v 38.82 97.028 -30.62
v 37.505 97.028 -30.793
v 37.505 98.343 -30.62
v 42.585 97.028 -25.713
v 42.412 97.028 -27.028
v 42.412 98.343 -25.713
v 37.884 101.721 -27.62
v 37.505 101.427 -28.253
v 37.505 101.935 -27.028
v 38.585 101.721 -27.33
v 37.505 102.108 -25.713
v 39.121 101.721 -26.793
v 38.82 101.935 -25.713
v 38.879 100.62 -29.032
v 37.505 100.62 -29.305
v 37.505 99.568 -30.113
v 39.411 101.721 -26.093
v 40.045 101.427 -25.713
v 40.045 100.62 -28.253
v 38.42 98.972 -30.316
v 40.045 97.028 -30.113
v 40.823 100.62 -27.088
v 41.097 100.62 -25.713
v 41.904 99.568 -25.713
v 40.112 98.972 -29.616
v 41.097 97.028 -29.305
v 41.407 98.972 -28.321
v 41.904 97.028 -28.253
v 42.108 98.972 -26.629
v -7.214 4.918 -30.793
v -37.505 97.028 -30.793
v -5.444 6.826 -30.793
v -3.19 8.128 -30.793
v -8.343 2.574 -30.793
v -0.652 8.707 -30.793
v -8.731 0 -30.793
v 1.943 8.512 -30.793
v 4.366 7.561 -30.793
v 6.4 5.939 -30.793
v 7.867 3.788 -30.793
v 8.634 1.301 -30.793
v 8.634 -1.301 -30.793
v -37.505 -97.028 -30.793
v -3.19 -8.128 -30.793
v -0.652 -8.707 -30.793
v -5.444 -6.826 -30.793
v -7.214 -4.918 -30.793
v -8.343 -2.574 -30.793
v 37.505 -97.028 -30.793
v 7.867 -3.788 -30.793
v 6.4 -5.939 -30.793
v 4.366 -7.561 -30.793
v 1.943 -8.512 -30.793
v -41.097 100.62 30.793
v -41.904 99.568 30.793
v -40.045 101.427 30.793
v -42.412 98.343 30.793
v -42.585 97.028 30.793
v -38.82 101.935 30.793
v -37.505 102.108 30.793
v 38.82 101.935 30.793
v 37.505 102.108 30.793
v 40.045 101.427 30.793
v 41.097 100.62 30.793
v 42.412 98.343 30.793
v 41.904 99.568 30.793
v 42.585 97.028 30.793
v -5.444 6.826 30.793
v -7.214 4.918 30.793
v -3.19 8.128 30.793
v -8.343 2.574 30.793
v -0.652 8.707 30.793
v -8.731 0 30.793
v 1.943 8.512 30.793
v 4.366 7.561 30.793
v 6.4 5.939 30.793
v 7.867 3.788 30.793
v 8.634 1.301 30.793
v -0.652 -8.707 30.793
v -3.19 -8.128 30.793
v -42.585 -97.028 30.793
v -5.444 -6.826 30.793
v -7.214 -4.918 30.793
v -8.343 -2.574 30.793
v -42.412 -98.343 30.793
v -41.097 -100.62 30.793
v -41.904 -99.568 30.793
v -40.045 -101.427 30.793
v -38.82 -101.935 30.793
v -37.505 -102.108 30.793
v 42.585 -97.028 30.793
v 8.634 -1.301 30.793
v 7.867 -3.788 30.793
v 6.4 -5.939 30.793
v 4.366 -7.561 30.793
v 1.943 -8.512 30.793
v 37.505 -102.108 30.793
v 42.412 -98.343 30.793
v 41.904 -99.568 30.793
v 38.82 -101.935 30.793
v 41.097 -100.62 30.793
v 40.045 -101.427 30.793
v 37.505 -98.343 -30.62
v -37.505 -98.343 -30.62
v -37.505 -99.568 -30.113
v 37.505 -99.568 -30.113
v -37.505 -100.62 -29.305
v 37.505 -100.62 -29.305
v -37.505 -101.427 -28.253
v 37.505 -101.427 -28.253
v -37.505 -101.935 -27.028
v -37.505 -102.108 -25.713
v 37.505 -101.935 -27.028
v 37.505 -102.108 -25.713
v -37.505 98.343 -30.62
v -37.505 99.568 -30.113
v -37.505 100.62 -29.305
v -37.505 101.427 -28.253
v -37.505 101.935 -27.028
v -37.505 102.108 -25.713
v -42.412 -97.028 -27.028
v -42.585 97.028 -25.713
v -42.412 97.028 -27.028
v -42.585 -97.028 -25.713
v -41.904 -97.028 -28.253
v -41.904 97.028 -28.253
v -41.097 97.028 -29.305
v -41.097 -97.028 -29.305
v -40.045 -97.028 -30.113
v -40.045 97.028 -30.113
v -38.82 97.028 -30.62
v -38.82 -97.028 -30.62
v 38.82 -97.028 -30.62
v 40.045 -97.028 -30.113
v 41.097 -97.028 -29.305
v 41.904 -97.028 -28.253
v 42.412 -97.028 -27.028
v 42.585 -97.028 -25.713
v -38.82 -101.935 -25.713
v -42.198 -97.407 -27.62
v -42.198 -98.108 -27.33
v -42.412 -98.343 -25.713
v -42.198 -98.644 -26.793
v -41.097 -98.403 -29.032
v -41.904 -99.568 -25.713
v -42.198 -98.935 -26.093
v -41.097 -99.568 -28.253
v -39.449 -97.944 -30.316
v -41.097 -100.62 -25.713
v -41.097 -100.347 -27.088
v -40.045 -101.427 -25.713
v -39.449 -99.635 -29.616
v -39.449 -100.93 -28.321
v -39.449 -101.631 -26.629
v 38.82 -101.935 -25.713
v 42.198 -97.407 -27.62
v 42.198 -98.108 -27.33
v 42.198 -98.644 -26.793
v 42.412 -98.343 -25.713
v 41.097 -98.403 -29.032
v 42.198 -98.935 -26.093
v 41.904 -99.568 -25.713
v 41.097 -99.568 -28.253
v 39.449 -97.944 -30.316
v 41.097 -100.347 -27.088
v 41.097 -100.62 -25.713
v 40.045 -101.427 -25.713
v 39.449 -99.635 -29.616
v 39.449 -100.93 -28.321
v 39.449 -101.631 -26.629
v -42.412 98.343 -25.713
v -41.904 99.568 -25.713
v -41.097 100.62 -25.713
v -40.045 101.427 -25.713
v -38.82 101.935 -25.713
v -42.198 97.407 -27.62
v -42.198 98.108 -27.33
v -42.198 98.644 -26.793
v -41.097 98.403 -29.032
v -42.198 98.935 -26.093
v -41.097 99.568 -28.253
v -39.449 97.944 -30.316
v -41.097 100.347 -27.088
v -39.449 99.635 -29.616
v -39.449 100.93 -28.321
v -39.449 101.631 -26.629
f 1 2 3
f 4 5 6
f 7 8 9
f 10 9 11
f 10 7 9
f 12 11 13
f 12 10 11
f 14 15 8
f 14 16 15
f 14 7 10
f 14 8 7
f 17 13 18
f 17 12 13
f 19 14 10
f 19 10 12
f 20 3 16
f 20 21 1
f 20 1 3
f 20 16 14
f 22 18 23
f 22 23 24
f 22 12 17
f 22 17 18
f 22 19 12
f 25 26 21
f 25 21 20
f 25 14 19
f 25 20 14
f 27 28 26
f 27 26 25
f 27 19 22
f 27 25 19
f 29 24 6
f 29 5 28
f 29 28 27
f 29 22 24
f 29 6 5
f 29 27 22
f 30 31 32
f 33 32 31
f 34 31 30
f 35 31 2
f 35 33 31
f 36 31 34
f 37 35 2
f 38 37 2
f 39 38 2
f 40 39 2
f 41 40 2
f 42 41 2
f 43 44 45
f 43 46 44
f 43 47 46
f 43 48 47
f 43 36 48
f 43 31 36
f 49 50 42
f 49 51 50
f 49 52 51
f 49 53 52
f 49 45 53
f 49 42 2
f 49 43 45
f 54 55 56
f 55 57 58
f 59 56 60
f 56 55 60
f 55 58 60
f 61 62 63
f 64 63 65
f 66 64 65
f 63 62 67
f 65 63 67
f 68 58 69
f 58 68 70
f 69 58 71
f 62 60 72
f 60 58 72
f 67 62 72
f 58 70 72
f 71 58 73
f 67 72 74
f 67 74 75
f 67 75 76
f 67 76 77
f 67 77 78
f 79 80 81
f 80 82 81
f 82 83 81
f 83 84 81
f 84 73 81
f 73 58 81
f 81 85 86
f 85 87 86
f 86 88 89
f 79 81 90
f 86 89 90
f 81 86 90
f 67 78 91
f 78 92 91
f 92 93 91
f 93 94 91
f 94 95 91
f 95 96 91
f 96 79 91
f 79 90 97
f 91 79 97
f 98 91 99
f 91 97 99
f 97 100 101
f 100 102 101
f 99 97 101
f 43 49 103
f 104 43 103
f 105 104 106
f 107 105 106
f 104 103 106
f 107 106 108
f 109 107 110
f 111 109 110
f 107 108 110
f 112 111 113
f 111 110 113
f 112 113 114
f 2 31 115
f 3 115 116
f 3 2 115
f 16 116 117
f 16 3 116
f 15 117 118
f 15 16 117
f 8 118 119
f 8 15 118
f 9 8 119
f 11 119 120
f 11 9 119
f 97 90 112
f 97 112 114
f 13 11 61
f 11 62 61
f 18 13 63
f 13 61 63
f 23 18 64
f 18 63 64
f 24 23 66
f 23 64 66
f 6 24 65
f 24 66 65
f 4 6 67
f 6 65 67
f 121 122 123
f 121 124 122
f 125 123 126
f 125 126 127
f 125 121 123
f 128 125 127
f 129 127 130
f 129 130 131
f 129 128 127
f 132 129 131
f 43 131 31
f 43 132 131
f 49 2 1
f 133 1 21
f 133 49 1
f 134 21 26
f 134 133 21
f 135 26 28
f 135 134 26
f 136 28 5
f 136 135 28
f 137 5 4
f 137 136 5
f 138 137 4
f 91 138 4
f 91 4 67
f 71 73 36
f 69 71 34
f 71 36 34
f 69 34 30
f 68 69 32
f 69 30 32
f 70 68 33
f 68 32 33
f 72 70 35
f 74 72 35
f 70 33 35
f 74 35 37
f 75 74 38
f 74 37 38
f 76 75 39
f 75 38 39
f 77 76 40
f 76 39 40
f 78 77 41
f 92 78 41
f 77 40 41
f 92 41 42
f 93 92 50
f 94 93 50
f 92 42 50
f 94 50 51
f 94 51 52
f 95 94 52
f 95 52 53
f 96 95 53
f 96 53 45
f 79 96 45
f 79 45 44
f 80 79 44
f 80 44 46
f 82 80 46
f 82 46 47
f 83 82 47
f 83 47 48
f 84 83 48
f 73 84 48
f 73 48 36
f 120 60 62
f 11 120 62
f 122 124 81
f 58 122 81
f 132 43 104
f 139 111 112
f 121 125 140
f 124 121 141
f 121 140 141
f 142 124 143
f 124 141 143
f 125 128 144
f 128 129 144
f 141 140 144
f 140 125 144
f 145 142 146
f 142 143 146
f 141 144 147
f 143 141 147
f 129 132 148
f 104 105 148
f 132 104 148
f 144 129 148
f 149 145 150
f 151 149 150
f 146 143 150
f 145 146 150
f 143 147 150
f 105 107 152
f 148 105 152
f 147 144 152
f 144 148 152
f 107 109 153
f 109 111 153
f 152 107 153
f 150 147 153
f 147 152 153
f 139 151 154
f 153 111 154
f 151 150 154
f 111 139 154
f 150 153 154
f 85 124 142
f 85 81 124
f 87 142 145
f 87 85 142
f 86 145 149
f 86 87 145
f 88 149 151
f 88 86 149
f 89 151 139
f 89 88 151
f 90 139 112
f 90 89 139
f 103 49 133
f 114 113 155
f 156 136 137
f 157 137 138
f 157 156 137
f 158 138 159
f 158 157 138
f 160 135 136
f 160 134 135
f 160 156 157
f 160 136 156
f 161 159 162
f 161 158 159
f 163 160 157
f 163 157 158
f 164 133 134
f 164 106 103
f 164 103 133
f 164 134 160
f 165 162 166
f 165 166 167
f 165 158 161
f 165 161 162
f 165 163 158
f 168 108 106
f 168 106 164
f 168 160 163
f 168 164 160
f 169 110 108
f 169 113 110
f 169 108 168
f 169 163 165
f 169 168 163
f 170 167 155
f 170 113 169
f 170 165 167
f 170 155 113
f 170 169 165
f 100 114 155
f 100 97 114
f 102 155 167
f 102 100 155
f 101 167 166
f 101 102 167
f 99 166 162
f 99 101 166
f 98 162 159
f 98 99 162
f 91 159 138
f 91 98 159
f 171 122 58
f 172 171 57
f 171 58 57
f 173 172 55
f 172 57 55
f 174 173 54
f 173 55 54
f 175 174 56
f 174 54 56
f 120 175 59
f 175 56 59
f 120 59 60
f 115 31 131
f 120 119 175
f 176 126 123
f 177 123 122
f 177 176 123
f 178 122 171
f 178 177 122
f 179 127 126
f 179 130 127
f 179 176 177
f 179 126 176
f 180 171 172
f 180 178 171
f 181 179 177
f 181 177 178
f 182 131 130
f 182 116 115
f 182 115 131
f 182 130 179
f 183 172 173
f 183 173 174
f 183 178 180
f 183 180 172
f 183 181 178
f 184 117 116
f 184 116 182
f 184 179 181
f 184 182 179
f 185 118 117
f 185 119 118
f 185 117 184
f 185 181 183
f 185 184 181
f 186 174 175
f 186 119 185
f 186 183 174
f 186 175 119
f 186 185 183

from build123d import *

# Parameters (mm, degrees)
F0_W     = 85.1696208119
F0_H     = 61.5866929293
F1_DEPTH = 102.108
F3_D     = 17.4625
F4_R     = 5.08


with BuildPart() as f1:
    # F0 (on Front) → F1 (new body, symmetric)
    with BuildSketch(Plane.XZ):
        Rectangle(F0_W, F0_H)
    extrude(amount=F1_DEPTH, both=True)

    # F3 (through all)
    with Locations(Plane.XY.offset(30.7933464646)):
        with Locations((0, 0)):
            Hole(F3_D / 2)

    # F4
    f4_edges = [f1.edges().sort_by_distance(p)[0] for p in [
        (0, -102.108, -30.793346),
        (42.58481, 0, -30.793346),
        (0, 102.108, -30.793346),
        (-42.58481, 0, -30.793346),
        (-42.58481, -102.108, 0),
        (-42.58481, 102.108, 0),
        (42.58481, 102.108, 0),
        (42.58481, -102.108, 0),
    ]]
    fillet(f4_edges, radius=F4_R)


solid = f1.part
